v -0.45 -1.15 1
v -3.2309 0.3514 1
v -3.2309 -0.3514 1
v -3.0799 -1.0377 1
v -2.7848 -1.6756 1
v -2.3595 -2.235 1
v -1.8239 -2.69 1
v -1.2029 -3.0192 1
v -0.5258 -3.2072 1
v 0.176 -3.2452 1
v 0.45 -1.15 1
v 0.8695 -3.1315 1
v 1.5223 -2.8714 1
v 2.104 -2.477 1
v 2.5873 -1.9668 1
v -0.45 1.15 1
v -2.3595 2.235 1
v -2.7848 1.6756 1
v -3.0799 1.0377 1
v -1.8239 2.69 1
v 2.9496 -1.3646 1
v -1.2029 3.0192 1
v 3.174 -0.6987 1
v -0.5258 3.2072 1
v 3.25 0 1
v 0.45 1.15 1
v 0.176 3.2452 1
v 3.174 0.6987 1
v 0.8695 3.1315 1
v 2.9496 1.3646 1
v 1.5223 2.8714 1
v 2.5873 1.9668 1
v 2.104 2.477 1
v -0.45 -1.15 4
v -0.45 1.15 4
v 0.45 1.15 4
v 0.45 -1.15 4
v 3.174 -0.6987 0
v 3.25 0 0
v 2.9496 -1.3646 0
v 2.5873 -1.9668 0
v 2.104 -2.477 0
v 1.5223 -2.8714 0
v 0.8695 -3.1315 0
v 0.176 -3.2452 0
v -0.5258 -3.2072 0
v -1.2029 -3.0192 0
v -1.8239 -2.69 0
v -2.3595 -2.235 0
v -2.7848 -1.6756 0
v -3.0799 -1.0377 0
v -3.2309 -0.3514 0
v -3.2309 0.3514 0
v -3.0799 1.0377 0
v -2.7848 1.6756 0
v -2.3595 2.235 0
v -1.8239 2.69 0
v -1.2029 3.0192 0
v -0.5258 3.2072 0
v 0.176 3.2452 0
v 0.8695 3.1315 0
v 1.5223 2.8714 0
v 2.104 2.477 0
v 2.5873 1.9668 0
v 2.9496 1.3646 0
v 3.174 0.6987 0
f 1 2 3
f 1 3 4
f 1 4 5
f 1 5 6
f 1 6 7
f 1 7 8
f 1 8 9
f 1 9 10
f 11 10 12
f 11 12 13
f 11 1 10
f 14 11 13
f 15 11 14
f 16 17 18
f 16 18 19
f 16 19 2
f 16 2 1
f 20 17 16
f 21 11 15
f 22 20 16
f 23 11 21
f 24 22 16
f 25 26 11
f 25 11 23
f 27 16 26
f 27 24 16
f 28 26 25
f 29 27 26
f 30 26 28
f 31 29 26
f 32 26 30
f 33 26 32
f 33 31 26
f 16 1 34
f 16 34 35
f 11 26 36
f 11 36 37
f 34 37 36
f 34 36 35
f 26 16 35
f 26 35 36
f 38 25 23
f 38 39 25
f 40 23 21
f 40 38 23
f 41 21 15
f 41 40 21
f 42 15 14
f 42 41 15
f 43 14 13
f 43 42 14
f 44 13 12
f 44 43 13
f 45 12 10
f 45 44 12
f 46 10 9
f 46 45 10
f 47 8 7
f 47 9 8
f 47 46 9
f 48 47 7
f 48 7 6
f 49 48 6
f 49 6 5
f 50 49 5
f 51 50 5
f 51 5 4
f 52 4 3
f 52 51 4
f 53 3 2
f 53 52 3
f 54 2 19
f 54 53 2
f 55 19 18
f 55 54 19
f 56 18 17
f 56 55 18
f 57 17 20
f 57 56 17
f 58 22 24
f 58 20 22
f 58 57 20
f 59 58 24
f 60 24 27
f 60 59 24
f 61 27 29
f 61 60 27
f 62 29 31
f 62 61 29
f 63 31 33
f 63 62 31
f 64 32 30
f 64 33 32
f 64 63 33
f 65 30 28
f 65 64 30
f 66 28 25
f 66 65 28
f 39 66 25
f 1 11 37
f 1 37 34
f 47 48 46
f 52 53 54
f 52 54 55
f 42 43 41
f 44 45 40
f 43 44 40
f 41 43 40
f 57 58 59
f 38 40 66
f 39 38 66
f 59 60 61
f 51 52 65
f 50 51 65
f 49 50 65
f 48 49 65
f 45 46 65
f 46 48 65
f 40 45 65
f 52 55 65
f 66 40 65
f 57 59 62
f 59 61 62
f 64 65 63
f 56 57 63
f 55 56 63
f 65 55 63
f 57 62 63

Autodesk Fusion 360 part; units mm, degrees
sketch "Esquisse1" plane through (0, 0, 0) normal (0, 0, 1) x (1, 0, 0)
  circle A0 centre (0, 0) radius 3.25
  dimension "d1" = 6.5
extrude "Extrusion1" add sketch "Esquisse1" along normal blind 1
sketch "Esquisse2" plane through (0, 0, 1) normal (0, 0, 1) x (-1, 0, 0)
  circle A0 centre (0, 0) radius 3.25
  line L0 (-0.45, 1.15) -> (0.45, 1.15)
  line L1 (0.45, 1.15) -> (0.45, -1.15)
  line L2 (0.45, -1.15) -> (-0.45, -1.15)
  line L3 (-0.45, -1.15) -> (-0.45, 1.15)
  line L4 (-0.45, 1.15) -> (0.45, -1.15) construction
  line L5 (0.45, 1.15) -> (-0.45, -1.15) construction
  dimension "d4" = 0.9
  dimension "d5" = 2.3
extrude "Extrusion2" add sketch "Esquisse2" along normal blind 3 contours L0 L1 L2 L3
